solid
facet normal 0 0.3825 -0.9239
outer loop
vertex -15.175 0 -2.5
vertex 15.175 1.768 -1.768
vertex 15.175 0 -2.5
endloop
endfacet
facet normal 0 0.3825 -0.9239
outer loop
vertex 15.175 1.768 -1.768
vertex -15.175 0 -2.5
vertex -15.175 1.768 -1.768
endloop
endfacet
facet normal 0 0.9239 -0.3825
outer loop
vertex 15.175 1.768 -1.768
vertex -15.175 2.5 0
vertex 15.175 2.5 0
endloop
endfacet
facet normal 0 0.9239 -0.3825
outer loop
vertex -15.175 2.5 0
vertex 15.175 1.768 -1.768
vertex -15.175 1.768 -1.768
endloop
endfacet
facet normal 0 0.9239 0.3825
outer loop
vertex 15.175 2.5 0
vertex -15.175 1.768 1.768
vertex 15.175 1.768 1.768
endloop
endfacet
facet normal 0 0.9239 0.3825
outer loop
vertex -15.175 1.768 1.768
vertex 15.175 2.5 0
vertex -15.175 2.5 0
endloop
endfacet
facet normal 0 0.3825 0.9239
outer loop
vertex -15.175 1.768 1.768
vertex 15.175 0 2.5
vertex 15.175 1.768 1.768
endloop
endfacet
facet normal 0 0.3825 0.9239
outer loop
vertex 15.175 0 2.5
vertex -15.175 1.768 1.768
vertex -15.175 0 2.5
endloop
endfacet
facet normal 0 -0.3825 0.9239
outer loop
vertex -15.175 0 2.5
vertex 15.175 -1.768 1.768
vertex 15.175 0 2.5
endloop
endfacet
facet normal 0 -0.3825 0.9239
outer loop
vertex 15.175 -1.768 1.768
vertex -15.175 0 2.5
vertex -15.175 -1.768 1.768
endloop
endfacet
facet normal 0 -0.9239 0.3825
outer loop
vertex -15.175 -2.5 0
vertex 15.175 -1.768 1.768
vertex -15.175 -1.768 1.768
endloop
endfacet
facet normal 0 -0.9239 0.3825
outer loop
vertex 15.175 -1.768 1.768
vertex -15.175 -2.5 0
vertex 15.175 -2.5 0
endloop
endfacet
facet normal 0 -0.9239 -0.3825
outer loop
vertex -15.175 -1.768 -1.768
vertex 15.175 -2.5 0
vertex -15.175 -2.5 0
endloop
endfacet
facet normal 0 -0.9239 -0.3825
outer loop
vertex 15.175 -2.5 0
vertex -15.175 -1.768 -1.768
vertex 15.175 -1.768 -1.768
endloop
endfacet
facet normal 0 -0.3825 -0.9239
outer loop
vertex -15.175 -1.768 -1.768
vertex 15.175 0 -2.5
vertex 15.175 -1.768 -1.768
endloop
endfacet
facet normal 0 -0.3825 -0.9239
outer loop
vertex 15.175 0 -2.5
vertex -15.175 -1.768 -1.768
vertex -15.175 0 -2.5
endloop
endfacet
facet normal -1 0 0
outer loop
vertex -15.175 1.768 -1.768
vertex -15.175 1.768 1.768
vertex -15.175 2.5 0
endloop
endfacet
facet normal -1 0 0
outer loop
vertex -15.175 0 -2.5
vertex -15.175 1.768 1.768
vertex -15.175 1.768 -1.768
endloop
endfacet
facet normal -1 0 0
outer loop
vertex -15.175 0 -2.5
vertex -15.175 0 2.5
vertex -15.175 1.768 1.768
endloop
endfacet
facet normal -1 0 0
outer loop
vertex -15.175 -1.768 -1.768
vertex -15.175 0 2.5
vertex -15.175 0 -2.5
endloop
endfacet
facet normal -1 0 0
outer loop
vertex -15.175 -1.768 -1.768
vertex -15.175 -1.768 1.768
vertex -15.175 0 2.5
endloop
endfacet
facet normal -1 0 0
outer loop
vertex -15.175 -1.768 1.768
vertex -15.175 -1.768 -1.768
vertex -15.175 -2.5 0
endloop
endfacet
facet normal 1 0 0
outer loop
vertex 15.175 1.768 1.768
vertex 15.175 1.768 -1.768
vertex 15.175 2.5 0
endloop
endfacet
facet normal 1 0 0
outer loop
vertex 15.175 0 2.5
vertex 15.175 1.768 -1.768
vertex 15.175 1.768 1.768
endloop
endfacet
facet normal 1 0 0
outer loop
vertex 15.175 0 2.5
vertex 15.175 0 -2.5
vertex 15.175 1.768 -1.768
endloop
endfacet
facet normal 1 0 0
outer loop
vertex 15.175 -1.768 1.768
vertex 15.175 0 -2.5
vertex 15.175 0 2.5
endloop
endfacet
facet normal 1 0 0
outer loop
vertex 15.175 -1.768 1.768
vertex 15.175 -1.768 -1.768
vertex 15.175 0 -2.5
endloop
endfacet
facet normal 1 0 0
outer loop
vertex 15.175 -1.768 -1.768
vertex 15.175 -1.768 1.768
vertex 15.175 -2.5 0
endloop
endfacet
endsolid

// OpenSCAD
module duplo_nipple(outer = 9.35, inner = 6.93, height = 4.5)
{
  difference()
  {
    cylinder(height,outer/2,outer/2,center=true);
    cylinder(height+1,inner/2,inner/2,center=true);
  }
}

module duplo_top(x = 2, y = 4, spacing = 16.0, parimeter = 3.2+9.35/2, height = 4.5, thickness = 2)
{
  union()
  {
    for (i = [0:x-1]) 
    {
      for (j = [0:y-1])
      {
        translate([((i-(x-1)/2)*spacing),((j-(y-1)/2)*spacing),(height+thickness)/2]) duplo_nipple();
      }
    }
    cube([(x-1)*spacing+2*parimeter,(y-1)*spacing+2*parimeter,thickness],center=true);
  }
}

module half_hook(inner_offset=0.2)
{
  outer_diameter = 18.0;
  thickness = 5.5;
  inner_diameter = 7.8+inner_offset;
  wall_thinkness = (outer_diameter-inner_diameter)/2;
  difference()
  {
    union()
    {
      difference()
      {
        cylinder(thickness,outer_diameter/2,outer_diameter/2,center=true);
        translate([(outer_diameter)/4,0,0]) cube([outer_diameter/2,outer_diameter,thickness+1],center=true);
      }
      translate([0,(inner_diameter/2+wall_thinkness/2),0]) cylinder(thickness,wall_thinkness/2,wall_thinkness/2,center=true);
    }
    cylinder(thickness+1,inner_diameter/2,inner_diameter/2,center=true);
    translate([0,0,-(thickness*3+0.1)/8]) cylinder(thickness/4,(inner_diameter+3)/2,inner_diameter/2,center=true);
    translate([0,0,(thickness*3+0.1)/8]) cylinder(thickness/4,inner_diameter/2,(inner_diameter+3)/2,center=true);
  
  }
}

module hook_1()
{
  angle = 50;
  attach_width = 4;
  attach_length = 13;
  attach_thickness = 5.5;
  union()
  {
    rotate([0,0,angle]) half_hook();
    rotate([0,0,-angle]) rotate([0,180,0]) half_hook();
    translate([0,-7.5,0])  cube([attach_length,attach_width,attach_thickness],center=true);
  }
  //%cube([6.35,20,6],center=true);
}

module hook_2()
{
  hook_diameter = 7.0;
  latch_diameter = 7.8;
  latch_thickness = 2.3;
  height = 16;
  base_thinkness = 7.0;
  attach_width = 11;
  attach_length = 13;
  attach_thickness = 5.5;
  translate([0,0,-1.5]) 
  union()
  {
    cylinder(height,hook_diameter/2,hook_diameter/2,center=true);
    translate([0,0,(height-latch_thickness)/2]) 
    difference()
    {
      cylinder(latch_thickness,latch_diameter/2,latch_diameter/2,center=true);
      translate([0,latch_diameter/4,0]) cube([latch_diameter,latch_diameter/2,latch_thickness+1],center=true);
    }
    translate([0,4.5,-(height-attach_thickness)/2])  
    difference()
    {
      cube([attach_length,attach_width,attach_thickness],center=true);
      translate([-8.5,0,0]) rotate([0,0,18]) cube([attach_length/2,attach_width*2,attach_thickness+1],center=true);
      translate([8.5,0,0]) rotate([0,0,-18]) cube([attach_length/2,attach_width*2,attach_thickness+1],center=true);
    
    }
  }
}

module wheels()
{
  wheel_diameter = 22;
  thinkness = 3.5;
  center_thinkness = 5;
  center_diameter = 10;
  hole = 7.2;
  difference()
  {
    union()
    {
      translate([0,0,-(center_thinkness-thinkness)/2]) cylinder(thinkness,wheel_diameter/2,wheel_diameter/2,center=true);
      cylinder(center_thinkness,center_diameter/2,center_diameter/2,center=true);
    }
    cylinder(center_thinkness+1,hole/2,hole/2,center=true);
  }
}

module bolt(diameter = 6)
{
  length = 17;
  keeper_length = 10;
  keeper_thickness = 2;
  union()
  {
    cylinder(length,diameter/2,diameter/2,center=true);
    translate([0,0,(length-keeper_thickness)/2]) 
    difference()
    {
      cylinder(keeper_thickness,keeper_length/2,keeper_length/2,center=true);
      translate([0,-5.85,0]) cube([keeper_length,diameter,keeper_thickness+1],center=true);
    }
  }
}

module train_car(hook_support = 1, length = 63.75, wheel_length = 40, width = 31.75, height = 20, hole = 6.0)
{
  wheel_well = 26;
  well_depth = (width - 19)/2;
  difference()
  {
    union()
    {
      cube([width,length,height],center=true);
      translate([0,0,(height-2)/2]) duplo_top();
    }
    
    //translate([0,wheel_length/2,-5]) rotate([0,90,0]) cylinder(width,hole/2,hole/2,center=true);
    //translate([0,-wheel_length/2,-5]) rotate([0,90,0]) cylinder(width,hole/2,hole/2,center=true);
    translate([9.5,wheel_length/2,-5]) rotate([90,0,0]) rotate([0,90,0]) bolt(hole);
    translate([-9.5,wheel_length/2,-5]) rotate([90,0,0]) rotate([0,-90,0]) bolt(hole);
    translate([9.5,-wheel_length/2,-5]) rotate([90,0,0]) rotate([0,90,0]) bolt(hole);
    translate([-9.5,-wheel_length/2,-5]) rotate([90,0,0]) rotate([0,-90,0]) bolt(hole);
    
    %translate([9.5,wheel_length/2,-5]) rotate([90,0,0]) rotate([0,90,0]) bolt(hole);
    %translate([-9.5,wheel_length/2,-5]) rotate([90,0,0]) rotate([0,-90,0]) bolt(hole);
    %translate([9.5,-wheel_length/2,-5]) rotate([90,0,0]) rotate([0,90,0]) bolt(hole);
    %translate([-9.5,-wheel_length/2,-5]) rotate([90,0,0]) rotate([0,-90,0]) bolt(hole);
    %translate([12,wheel_length/2,-5]) rotate([0,-90,0]) wheels();
    %translate([12,-wheel_length/2,-5]) rotate([0,-90,0]) wheels();
    %translate([-12,wheel_length/2,-5]) rotate([0,90,0]) wheels();
    %translate([-12,-wheel_length/2,-5]) rotate([0,90,0]) wheels();
    
    
    translate([(19+well_depth)/2,wheel_length/2,-5]) rotate([0,90,0]) cylinder(well_depth+1,wheel_well/2,(wheel_well+2)/2,center=true);
    translate([(19+well_depth)/2,-wheel_length/2,-5]) rotate([0,90,0]) cylinder(well_depth+1,wheel_well/2,(wheel_well+2)/2,center=true);
    translate([-(19+well_depth)/2,wheel_length/2,-5]) rotate([0,90,0]) cylinder(well_depth+1,(wheel_well+2)/2,wheel_well/2,center=true);
    translate([-(19+well_depth)/2,-wheel_length/2,-5]) rotate([0,90,0]) cylinder(well_depth+1,(wheel_well+2)/2,wheel_well/2,center=true);
   
  }
  hook_height = -0.5;
  translate([0,-(length/2+10),hook_height]) hook_2();
  translate([0,(length/2+9.5),hook_height]) 
  union()
  {
    hook_1();
    //hook support
    if (hook_support==1) translate([0,0,-6.25]) difference()
    {
      cylinder(7,14/2,14/2,center=true);
      cylinder(7+1,13/2,13/2,center=true);
    }
  }
}

module train_car_long(hook_support = 1, length = 63.75 +32, wheel_length = 60, width = 31.75, height = 20, hole = 6.0)
{
  wheel_well = 26;
  well_depth = (width - 19)/2;
  difference()
  {
    union()
    {
      cube([width,length,height],center=true);
      translate([0,0,(height-2)/2]) duplo_top(y=6);
    }
    
    //translate([0,wheel_length/2,-5]) rotate([0,90,0]) cylinder(width,hole/2,hole/2,center=true);
    //translate([0,-wheel_length/2,-5]) rotate([0,90,0]) cylinder(width,hole/2,hole/2,center=true);
    translate([9.5,wheel_length/2,-5]) rotate([90,0,0]) rotate([0,90,0]) bolt(hole);
    translate([-9.5,wheel_length/2,-5]) rotate([90,0,0]) rotate([0,-90,0]) bolt(hole);
    translate([9.5,-wheel_length/2,-5]) rotate([90,0,0]) rotate([0,90,0]) bolt(hole);
    translate([-9.5,-wheel_length/2,-5]) rotate([90,0,0]) rotate([0,-90,0]) bolt(hole);
    
    %translate([9.5,wheel_length/2,-5]) rotate([90,0,0]) rotate([0,90,0]) bolt(hole);
    %translate([-9.5,wheel_length/2,-5]) rotate([90,0,0]) rotate([0,-90,0]) bolt(hole);
    %translate([9.5,-wheel_length/2,-5]) rotate([90,0,0]) rotate([0,90,0]) bolt(hole);
    %translate([-9.5,-wheel_length/2,-5]) rotate([90,0,0]) rotate([0,-90,0]) bolt(hole);
    %translate([12,wheel_length/2,-5]) rotate([0,-90,0]) wheels();
    %translate([12,-wheel_length/2,-5]) rotate([0,-90,0]) wheels();
    %translate([-12,wheel_length/2,-5]) rotate([0,90,0]) wheels();
    %translate([-12,-wheel_length/2,-5]) rotate([0,90,0]) wheels();
    
    
    translate([(19+well_depth)/2,wheel_length/2,-5]) rotate([0,90,0]) cylinder(well_depth+1,wheel_well/2,(wheel_well+2)/2,center=true);
    translate([(19+well_depth)/2,-wheel_length/2,-5]) rotate([0,90,0]) cylinder(well_depth+1,wheel_well/2,(wheel_well+2)/2,center=true);
    translate([-(19+well_depth)/2,wheel_length/2,-5]) rotate([0,90,0]) cylinder(well_depth+1,(wheel_well+2)/2,wheel_well/2,center=true);
    translate([-(19+well_depth)/2,-wheel_length/2,-5]) rotate([0,90,0]) cylinder(well_depth+1,(wheel_well+2)/2,wheel_well/2,center=true);
   
  }
  hook_height = -0.5;
  translate([0,-(length/2+10),hook_height]) hook_2();
  translate([0,(length/2+9.5),hook_height]) 
  union()
  {
    hook_1();
    //hook support
    if (hook_support==1) translate([0,0,-6.25]) difference()
    {
      cylinder(7,14/2,14/2,center=true);
      cylinder(7+1,13/2,13/2,center=true);
    }
  }
}

module wheel2(wheel_thinkness = 3.0, 
wheel_diameter = 24.0,
axel_diameter = 5.0,
axel_mount_depth = 4.0)
{
  axel_support_thinkness = 3.5;
  center_slant = wheel_diameter;
  center_diameter = axel_mount_depth + axel_support_thinkness;
  difference()
  {
    union()
    {
      difference()
      {
        cylinder(wheel_thinkness,wheel_diameter/2,wheel_diameter/2,center=true);
        cylinder(wheel_thinkness+0.1,(wheel_diameter-3)/2,0,center=true);
      }
      translate([0,0,-(axel_mount_depth-wheel_thinkness)/2]) cylinder(axel_mount_depth,center_diameter/2,center_slant/2,center=true);
    }
    translate([0,0,-(axel_mount_depth-wheel_thinkness)/2]) cylinder(axel_mount_depth+1,axel_diameter/2,axel_diameter/2,center=true);
  }
}

module simple_axel(length, thickness)
{
  cylinder(length,thickness/2,thickness/2,center=true);
}

module wheel_assembly(wheel_base = 25.35,
wheel_thinkness = 3.0, 
wheel_diameter = 22.0,
axel_diameter = 5.0,
axel_mount_depth = 4.0)
{
  %translate([wheel_base/2,0,0]) rotate([0,-90,0]) wheel2(wheel_thinkness, wheel_diameter, axel_diameter, axel_mount_depth);
  %translate([-wheel_base/2,0,0]) rotate([0,90,0]) wheel2(wheel_thinkness, wheel_diameter, axel_diameter, axel_mount_depth);
  rotate([0,90,0]) simple_axel(wheel_base+2*(axel_mount_depth-wheel_thinkness/2), axel_diameter);
}

module short_block(spacing = 32)
{
  translate([0,spacing/2,0]) wheel_assembly();
  translate([0,-spacing/2,0]) wheel_assembly();
  //TODO make a spinning, loose duplo top for this train car part
  translate([0,0,8]) cylinder(10,8,8,center=true);
  
  translate([0,0,12]) cylinder(2,(spacing-4)/2,(spacing+4)/2,center=true);
  
  translate([0,0,14]) duplo_top(x = 2, y = 3);
  //TODO add one magnet mount block to match the other train cars
}

module tack()
{
  pin_diameter = 1.4;
  pin_length = 17;
  tack_diameter = 11;
  tack_thickness = 3.65;
  color("gray") union()
  {
    cylinder(pin_length,pin_diameter/2,pin_diameter/2,center=true);
    translate([0,0,(pin_length-tack_thickness)/2]) cylinder(tack_thickness,tack_diameter/2,pin_diameter/2,center=true);
  }
}

module magnet()
{
  od = 12.7;
  id = 3.175;
  thickness = 3.175;
  color("lightblue") difference()
  {
    cylinder(thickness,od/2,od/2,center=true);
    cylinder(thickness+0.1,id/2,id/2,center=true);
  }
}

module magnet_assembly()
{
  tack();
  translate([0,0,(17/2-(3.6+3.175/2))]) magnet();
}

module magnet_holder(magnet_od = 12.7,
pin_od = 1.4,
pin_depth = 10.225,
magnet_depth = 3.175,
thickness = 2)
{
  holder_od = magnet_od + 2 * thickness;
  difference()
  {
    cylinder(pin_depth+magnet_depth,holder_od/2,holder_od/2,center=true);
    translate([0,0,pin_depth/2]) cylinder(magnet_depth+0.1,magnet_od/2,magnet_od/2,center=true);
    cylinder(pin_depth+magnet_depth,pin_od/2,pin_od/2,center=true);
  }
}

module short_car()
{
  spacing = 40;
  magnet_height = 16.5;
  wheel_base = 25.35;
  wheel_thinkness = 3.0;
  wheel_diameter = 22.0;
  axel_diameter = 5.0;
  axel_clearance = 0.25 + axel_diameter;
  wheel_well = wheel_diameter + 2;
  //wheel assembly place holder
  %translate([0,spacing/2,0]) wheel_assembly(wheel_base,wheel_thinkness,wheel_diameter,axel_diameter);
  %translate([0,-spacing/2,0]) wheel_assembly(wheel_base,wheel_thinkness,wheel_diameter,axel_diameter);
  
  //duplo train top
  translate([0,0,14]) duplo_top(x = 2, y = 4);
  
  //train body
  body_width = wheel_base-wheel_thinkness*2;
  well_depth = (32 - body_width)/2;
  difference()
  {
    union()
    {
      translate([0,0,wheel_diameter/4]) cube([body_width,64,14+axel_diameter],center=true);
      difference()
      {
        union()
        {
          translate([(32-10)/2,0,12]) cube([10,64,5],center=true);
          translate([-(32-10)/2,0,12]) cube([10,64,5],center=true);
        }
        translate([(32-10)/2,0,12]) rotate([0,-30,0]) translate([0,0,-4]) cube([10,65,5],center=true);
        translate([-(32-10)/2,0,12]) rotate([0,30,0]) translate([0,0,-4]) cube([10,65,5],center=true);
      }
    }
    translate([0,spacing/2,0]) rotate([0,90,0]) cylinder(body_width+0.1,axel_clearance/2,axel_clearance/2,center=true);
    translate([0,-spacing/2,0]) rotate([0,90,0]) cylinder(body_width+0.1,axel_clearance/2,axel_clearance/2,center=true);
    translate([0,0,-wheel_diameter/3]) rotate([0,90,0]) cylinder(body_width+0.1,wheel_diameter/2,wheel_diameter/2,center=true);
    //removing wheel well area
    translate([0,spacing/2,0]) translate([wheel_base/2,0,0]) rotate([0,-90,0])  cylinder(well_depth,wheel_well/2,wheel_well/2,center=true);
    translate([0,-spacing/2,0]) translate([wheel_base/2,0,0]) rotate([0,-90,0])  cylinder(well_depth,wheel_well/2,wheel_well/2,center=true);
    translate([0,spacing/2,0]) translate([-wheel_base/2,0,0]) rotate([0,-90,0])  cylinder(well_depth,wheel_well/2,wheel_well/2,center=true);
    translate([0,-spacing/2,0]) translate([-wheel_base/2,0,0]) rotate([0,-90,0])  cylinder(well_depth,wheel_well/2,wheel_well/2,center=true);
    
  }
  
  //magnet holders
  translate([0,-32,magnet_height-wheel_diameter/2]) rotate([90,0,0]) magnet_holder();
  translate([0,32,magnet_height-wheel_diameter/2]) rotate([-90,0,0]) magnet_holder();
}

module train_car1(hook_support = 1, 
length = 63.75, 
wheel_length = 40, 
width = 31.75, 
height = 20, 
hole = 6.0)
{
  wheel_well = 26;
  well_depth = (width - 19)/2;
  difference()
  {
    union()
    {
      cube([width,length,height],center=true);
      //translate([0,0,(height-2)/2]) duplo_top();
    }
    
    //translate([0,wheel_length/2,-5]) rotate([0,90,0]) cylinder(width,hole/2,hole/2,center=true);
    //translate([0,-wheel_length/2,-5]) rotate([0,90,0]) cylinder(width,hole/2,hole/2,center=true);
    translate([9.5,wheel_length/2,-5]) rotate([90,0,0]) rotate([0,90,0]) bolt(hole);
    translate([-9.5,wheel_length/2,-5]) rotate([90,0,0]) rotate([0,-90,0]) bolt(hole);
    translate([9.5,-wheel_length/2,-5]) rotate([90,0,0]) rotate([0,90,0]) bolt(hole);
    translate([-9.5,-wheel_length/2,-5]) rotate([90,0,0]) rotate([0,-90,0]) bolt(hole);
    
    %translate([9.5,wheel_length/2,-5]) rotate([90,0,0]) rotate([0,90,0]) bolt(hole);
    %translate([-9.5,wheel_length/2,-5]) rotate([90,0,0]) rotate([0,-90,0]) bolt(hole);
    %translate([9.5,-wheel_length/2,-5]) rotate([90,0,0]) rotate([0,90,0]) bolt(hole);
    %translate([-9.5,-wheel_length/2,-5]) rotate([90,0,0]) rotate([0,-90,0]) bolt(hole);
    %translate([12,wheel_length/2,-5]) rotate([0,-90,0]) wheels();
    %translate([12,-wheel_length/2,-5]) rotate([0,-90,0]) wheels();
    %translate([-12,wheel_length/2,-5]) rotate([0,90,0]) wheels();
    %translate([-12,-wheel_length/2,-5]) rotate([0,90,0]) wheels();
    
    
    translate([(19+well_depth)/2,wheel_length/2,-5]) rotate([0,90,0]) cylinder(well_depth+1,wheel_well/2,(wheel_well+2)/2,center=true);
    translate([(19+well_depth)/2,-wheel_length/2,-5]) rotate([0,90,0]) cylinder(well_depth+1,wheel_well/2,(wheel_well+2)/2,center=true);
    translate([-(19+well_depth)/2,wheel_length/2,-5]) rotate([0,90,0]) cylinder(well_depth+1,(wheel_well+2)/2,wheel_well/2,center=true);
    translate([-(19+well_depth)/2,-wheel_length/2,-5]) rotate([0,90,0]) cylinder(well_depth+1,(wheel_well+2)/2,wheel_well/2,center=true);
   
  }
  hook_height = -0.5;
  translate([0,-(length/2+10),hook_height]) hook_2();
  translate([0,(length/2+9.5),hook_height]) 
  union()
  {
    hook_1();
    //hook support
    if (hook_support==1) translate([0,0,-6.25]) difference()
    {
      cylinder(7,14/2,14/2,center=true);
      cylinder(7+1,13/2,13/2,center=true);
    }
  }
}


//wheels();
//rotate([90,0,0]) bolt();
//train_car_long(hook_support = 1);
//train_car1(hook_support = 0);
//short_block();

//short_car();
//rotate([180,0,0]) wheel2();
wheel_assembly();
